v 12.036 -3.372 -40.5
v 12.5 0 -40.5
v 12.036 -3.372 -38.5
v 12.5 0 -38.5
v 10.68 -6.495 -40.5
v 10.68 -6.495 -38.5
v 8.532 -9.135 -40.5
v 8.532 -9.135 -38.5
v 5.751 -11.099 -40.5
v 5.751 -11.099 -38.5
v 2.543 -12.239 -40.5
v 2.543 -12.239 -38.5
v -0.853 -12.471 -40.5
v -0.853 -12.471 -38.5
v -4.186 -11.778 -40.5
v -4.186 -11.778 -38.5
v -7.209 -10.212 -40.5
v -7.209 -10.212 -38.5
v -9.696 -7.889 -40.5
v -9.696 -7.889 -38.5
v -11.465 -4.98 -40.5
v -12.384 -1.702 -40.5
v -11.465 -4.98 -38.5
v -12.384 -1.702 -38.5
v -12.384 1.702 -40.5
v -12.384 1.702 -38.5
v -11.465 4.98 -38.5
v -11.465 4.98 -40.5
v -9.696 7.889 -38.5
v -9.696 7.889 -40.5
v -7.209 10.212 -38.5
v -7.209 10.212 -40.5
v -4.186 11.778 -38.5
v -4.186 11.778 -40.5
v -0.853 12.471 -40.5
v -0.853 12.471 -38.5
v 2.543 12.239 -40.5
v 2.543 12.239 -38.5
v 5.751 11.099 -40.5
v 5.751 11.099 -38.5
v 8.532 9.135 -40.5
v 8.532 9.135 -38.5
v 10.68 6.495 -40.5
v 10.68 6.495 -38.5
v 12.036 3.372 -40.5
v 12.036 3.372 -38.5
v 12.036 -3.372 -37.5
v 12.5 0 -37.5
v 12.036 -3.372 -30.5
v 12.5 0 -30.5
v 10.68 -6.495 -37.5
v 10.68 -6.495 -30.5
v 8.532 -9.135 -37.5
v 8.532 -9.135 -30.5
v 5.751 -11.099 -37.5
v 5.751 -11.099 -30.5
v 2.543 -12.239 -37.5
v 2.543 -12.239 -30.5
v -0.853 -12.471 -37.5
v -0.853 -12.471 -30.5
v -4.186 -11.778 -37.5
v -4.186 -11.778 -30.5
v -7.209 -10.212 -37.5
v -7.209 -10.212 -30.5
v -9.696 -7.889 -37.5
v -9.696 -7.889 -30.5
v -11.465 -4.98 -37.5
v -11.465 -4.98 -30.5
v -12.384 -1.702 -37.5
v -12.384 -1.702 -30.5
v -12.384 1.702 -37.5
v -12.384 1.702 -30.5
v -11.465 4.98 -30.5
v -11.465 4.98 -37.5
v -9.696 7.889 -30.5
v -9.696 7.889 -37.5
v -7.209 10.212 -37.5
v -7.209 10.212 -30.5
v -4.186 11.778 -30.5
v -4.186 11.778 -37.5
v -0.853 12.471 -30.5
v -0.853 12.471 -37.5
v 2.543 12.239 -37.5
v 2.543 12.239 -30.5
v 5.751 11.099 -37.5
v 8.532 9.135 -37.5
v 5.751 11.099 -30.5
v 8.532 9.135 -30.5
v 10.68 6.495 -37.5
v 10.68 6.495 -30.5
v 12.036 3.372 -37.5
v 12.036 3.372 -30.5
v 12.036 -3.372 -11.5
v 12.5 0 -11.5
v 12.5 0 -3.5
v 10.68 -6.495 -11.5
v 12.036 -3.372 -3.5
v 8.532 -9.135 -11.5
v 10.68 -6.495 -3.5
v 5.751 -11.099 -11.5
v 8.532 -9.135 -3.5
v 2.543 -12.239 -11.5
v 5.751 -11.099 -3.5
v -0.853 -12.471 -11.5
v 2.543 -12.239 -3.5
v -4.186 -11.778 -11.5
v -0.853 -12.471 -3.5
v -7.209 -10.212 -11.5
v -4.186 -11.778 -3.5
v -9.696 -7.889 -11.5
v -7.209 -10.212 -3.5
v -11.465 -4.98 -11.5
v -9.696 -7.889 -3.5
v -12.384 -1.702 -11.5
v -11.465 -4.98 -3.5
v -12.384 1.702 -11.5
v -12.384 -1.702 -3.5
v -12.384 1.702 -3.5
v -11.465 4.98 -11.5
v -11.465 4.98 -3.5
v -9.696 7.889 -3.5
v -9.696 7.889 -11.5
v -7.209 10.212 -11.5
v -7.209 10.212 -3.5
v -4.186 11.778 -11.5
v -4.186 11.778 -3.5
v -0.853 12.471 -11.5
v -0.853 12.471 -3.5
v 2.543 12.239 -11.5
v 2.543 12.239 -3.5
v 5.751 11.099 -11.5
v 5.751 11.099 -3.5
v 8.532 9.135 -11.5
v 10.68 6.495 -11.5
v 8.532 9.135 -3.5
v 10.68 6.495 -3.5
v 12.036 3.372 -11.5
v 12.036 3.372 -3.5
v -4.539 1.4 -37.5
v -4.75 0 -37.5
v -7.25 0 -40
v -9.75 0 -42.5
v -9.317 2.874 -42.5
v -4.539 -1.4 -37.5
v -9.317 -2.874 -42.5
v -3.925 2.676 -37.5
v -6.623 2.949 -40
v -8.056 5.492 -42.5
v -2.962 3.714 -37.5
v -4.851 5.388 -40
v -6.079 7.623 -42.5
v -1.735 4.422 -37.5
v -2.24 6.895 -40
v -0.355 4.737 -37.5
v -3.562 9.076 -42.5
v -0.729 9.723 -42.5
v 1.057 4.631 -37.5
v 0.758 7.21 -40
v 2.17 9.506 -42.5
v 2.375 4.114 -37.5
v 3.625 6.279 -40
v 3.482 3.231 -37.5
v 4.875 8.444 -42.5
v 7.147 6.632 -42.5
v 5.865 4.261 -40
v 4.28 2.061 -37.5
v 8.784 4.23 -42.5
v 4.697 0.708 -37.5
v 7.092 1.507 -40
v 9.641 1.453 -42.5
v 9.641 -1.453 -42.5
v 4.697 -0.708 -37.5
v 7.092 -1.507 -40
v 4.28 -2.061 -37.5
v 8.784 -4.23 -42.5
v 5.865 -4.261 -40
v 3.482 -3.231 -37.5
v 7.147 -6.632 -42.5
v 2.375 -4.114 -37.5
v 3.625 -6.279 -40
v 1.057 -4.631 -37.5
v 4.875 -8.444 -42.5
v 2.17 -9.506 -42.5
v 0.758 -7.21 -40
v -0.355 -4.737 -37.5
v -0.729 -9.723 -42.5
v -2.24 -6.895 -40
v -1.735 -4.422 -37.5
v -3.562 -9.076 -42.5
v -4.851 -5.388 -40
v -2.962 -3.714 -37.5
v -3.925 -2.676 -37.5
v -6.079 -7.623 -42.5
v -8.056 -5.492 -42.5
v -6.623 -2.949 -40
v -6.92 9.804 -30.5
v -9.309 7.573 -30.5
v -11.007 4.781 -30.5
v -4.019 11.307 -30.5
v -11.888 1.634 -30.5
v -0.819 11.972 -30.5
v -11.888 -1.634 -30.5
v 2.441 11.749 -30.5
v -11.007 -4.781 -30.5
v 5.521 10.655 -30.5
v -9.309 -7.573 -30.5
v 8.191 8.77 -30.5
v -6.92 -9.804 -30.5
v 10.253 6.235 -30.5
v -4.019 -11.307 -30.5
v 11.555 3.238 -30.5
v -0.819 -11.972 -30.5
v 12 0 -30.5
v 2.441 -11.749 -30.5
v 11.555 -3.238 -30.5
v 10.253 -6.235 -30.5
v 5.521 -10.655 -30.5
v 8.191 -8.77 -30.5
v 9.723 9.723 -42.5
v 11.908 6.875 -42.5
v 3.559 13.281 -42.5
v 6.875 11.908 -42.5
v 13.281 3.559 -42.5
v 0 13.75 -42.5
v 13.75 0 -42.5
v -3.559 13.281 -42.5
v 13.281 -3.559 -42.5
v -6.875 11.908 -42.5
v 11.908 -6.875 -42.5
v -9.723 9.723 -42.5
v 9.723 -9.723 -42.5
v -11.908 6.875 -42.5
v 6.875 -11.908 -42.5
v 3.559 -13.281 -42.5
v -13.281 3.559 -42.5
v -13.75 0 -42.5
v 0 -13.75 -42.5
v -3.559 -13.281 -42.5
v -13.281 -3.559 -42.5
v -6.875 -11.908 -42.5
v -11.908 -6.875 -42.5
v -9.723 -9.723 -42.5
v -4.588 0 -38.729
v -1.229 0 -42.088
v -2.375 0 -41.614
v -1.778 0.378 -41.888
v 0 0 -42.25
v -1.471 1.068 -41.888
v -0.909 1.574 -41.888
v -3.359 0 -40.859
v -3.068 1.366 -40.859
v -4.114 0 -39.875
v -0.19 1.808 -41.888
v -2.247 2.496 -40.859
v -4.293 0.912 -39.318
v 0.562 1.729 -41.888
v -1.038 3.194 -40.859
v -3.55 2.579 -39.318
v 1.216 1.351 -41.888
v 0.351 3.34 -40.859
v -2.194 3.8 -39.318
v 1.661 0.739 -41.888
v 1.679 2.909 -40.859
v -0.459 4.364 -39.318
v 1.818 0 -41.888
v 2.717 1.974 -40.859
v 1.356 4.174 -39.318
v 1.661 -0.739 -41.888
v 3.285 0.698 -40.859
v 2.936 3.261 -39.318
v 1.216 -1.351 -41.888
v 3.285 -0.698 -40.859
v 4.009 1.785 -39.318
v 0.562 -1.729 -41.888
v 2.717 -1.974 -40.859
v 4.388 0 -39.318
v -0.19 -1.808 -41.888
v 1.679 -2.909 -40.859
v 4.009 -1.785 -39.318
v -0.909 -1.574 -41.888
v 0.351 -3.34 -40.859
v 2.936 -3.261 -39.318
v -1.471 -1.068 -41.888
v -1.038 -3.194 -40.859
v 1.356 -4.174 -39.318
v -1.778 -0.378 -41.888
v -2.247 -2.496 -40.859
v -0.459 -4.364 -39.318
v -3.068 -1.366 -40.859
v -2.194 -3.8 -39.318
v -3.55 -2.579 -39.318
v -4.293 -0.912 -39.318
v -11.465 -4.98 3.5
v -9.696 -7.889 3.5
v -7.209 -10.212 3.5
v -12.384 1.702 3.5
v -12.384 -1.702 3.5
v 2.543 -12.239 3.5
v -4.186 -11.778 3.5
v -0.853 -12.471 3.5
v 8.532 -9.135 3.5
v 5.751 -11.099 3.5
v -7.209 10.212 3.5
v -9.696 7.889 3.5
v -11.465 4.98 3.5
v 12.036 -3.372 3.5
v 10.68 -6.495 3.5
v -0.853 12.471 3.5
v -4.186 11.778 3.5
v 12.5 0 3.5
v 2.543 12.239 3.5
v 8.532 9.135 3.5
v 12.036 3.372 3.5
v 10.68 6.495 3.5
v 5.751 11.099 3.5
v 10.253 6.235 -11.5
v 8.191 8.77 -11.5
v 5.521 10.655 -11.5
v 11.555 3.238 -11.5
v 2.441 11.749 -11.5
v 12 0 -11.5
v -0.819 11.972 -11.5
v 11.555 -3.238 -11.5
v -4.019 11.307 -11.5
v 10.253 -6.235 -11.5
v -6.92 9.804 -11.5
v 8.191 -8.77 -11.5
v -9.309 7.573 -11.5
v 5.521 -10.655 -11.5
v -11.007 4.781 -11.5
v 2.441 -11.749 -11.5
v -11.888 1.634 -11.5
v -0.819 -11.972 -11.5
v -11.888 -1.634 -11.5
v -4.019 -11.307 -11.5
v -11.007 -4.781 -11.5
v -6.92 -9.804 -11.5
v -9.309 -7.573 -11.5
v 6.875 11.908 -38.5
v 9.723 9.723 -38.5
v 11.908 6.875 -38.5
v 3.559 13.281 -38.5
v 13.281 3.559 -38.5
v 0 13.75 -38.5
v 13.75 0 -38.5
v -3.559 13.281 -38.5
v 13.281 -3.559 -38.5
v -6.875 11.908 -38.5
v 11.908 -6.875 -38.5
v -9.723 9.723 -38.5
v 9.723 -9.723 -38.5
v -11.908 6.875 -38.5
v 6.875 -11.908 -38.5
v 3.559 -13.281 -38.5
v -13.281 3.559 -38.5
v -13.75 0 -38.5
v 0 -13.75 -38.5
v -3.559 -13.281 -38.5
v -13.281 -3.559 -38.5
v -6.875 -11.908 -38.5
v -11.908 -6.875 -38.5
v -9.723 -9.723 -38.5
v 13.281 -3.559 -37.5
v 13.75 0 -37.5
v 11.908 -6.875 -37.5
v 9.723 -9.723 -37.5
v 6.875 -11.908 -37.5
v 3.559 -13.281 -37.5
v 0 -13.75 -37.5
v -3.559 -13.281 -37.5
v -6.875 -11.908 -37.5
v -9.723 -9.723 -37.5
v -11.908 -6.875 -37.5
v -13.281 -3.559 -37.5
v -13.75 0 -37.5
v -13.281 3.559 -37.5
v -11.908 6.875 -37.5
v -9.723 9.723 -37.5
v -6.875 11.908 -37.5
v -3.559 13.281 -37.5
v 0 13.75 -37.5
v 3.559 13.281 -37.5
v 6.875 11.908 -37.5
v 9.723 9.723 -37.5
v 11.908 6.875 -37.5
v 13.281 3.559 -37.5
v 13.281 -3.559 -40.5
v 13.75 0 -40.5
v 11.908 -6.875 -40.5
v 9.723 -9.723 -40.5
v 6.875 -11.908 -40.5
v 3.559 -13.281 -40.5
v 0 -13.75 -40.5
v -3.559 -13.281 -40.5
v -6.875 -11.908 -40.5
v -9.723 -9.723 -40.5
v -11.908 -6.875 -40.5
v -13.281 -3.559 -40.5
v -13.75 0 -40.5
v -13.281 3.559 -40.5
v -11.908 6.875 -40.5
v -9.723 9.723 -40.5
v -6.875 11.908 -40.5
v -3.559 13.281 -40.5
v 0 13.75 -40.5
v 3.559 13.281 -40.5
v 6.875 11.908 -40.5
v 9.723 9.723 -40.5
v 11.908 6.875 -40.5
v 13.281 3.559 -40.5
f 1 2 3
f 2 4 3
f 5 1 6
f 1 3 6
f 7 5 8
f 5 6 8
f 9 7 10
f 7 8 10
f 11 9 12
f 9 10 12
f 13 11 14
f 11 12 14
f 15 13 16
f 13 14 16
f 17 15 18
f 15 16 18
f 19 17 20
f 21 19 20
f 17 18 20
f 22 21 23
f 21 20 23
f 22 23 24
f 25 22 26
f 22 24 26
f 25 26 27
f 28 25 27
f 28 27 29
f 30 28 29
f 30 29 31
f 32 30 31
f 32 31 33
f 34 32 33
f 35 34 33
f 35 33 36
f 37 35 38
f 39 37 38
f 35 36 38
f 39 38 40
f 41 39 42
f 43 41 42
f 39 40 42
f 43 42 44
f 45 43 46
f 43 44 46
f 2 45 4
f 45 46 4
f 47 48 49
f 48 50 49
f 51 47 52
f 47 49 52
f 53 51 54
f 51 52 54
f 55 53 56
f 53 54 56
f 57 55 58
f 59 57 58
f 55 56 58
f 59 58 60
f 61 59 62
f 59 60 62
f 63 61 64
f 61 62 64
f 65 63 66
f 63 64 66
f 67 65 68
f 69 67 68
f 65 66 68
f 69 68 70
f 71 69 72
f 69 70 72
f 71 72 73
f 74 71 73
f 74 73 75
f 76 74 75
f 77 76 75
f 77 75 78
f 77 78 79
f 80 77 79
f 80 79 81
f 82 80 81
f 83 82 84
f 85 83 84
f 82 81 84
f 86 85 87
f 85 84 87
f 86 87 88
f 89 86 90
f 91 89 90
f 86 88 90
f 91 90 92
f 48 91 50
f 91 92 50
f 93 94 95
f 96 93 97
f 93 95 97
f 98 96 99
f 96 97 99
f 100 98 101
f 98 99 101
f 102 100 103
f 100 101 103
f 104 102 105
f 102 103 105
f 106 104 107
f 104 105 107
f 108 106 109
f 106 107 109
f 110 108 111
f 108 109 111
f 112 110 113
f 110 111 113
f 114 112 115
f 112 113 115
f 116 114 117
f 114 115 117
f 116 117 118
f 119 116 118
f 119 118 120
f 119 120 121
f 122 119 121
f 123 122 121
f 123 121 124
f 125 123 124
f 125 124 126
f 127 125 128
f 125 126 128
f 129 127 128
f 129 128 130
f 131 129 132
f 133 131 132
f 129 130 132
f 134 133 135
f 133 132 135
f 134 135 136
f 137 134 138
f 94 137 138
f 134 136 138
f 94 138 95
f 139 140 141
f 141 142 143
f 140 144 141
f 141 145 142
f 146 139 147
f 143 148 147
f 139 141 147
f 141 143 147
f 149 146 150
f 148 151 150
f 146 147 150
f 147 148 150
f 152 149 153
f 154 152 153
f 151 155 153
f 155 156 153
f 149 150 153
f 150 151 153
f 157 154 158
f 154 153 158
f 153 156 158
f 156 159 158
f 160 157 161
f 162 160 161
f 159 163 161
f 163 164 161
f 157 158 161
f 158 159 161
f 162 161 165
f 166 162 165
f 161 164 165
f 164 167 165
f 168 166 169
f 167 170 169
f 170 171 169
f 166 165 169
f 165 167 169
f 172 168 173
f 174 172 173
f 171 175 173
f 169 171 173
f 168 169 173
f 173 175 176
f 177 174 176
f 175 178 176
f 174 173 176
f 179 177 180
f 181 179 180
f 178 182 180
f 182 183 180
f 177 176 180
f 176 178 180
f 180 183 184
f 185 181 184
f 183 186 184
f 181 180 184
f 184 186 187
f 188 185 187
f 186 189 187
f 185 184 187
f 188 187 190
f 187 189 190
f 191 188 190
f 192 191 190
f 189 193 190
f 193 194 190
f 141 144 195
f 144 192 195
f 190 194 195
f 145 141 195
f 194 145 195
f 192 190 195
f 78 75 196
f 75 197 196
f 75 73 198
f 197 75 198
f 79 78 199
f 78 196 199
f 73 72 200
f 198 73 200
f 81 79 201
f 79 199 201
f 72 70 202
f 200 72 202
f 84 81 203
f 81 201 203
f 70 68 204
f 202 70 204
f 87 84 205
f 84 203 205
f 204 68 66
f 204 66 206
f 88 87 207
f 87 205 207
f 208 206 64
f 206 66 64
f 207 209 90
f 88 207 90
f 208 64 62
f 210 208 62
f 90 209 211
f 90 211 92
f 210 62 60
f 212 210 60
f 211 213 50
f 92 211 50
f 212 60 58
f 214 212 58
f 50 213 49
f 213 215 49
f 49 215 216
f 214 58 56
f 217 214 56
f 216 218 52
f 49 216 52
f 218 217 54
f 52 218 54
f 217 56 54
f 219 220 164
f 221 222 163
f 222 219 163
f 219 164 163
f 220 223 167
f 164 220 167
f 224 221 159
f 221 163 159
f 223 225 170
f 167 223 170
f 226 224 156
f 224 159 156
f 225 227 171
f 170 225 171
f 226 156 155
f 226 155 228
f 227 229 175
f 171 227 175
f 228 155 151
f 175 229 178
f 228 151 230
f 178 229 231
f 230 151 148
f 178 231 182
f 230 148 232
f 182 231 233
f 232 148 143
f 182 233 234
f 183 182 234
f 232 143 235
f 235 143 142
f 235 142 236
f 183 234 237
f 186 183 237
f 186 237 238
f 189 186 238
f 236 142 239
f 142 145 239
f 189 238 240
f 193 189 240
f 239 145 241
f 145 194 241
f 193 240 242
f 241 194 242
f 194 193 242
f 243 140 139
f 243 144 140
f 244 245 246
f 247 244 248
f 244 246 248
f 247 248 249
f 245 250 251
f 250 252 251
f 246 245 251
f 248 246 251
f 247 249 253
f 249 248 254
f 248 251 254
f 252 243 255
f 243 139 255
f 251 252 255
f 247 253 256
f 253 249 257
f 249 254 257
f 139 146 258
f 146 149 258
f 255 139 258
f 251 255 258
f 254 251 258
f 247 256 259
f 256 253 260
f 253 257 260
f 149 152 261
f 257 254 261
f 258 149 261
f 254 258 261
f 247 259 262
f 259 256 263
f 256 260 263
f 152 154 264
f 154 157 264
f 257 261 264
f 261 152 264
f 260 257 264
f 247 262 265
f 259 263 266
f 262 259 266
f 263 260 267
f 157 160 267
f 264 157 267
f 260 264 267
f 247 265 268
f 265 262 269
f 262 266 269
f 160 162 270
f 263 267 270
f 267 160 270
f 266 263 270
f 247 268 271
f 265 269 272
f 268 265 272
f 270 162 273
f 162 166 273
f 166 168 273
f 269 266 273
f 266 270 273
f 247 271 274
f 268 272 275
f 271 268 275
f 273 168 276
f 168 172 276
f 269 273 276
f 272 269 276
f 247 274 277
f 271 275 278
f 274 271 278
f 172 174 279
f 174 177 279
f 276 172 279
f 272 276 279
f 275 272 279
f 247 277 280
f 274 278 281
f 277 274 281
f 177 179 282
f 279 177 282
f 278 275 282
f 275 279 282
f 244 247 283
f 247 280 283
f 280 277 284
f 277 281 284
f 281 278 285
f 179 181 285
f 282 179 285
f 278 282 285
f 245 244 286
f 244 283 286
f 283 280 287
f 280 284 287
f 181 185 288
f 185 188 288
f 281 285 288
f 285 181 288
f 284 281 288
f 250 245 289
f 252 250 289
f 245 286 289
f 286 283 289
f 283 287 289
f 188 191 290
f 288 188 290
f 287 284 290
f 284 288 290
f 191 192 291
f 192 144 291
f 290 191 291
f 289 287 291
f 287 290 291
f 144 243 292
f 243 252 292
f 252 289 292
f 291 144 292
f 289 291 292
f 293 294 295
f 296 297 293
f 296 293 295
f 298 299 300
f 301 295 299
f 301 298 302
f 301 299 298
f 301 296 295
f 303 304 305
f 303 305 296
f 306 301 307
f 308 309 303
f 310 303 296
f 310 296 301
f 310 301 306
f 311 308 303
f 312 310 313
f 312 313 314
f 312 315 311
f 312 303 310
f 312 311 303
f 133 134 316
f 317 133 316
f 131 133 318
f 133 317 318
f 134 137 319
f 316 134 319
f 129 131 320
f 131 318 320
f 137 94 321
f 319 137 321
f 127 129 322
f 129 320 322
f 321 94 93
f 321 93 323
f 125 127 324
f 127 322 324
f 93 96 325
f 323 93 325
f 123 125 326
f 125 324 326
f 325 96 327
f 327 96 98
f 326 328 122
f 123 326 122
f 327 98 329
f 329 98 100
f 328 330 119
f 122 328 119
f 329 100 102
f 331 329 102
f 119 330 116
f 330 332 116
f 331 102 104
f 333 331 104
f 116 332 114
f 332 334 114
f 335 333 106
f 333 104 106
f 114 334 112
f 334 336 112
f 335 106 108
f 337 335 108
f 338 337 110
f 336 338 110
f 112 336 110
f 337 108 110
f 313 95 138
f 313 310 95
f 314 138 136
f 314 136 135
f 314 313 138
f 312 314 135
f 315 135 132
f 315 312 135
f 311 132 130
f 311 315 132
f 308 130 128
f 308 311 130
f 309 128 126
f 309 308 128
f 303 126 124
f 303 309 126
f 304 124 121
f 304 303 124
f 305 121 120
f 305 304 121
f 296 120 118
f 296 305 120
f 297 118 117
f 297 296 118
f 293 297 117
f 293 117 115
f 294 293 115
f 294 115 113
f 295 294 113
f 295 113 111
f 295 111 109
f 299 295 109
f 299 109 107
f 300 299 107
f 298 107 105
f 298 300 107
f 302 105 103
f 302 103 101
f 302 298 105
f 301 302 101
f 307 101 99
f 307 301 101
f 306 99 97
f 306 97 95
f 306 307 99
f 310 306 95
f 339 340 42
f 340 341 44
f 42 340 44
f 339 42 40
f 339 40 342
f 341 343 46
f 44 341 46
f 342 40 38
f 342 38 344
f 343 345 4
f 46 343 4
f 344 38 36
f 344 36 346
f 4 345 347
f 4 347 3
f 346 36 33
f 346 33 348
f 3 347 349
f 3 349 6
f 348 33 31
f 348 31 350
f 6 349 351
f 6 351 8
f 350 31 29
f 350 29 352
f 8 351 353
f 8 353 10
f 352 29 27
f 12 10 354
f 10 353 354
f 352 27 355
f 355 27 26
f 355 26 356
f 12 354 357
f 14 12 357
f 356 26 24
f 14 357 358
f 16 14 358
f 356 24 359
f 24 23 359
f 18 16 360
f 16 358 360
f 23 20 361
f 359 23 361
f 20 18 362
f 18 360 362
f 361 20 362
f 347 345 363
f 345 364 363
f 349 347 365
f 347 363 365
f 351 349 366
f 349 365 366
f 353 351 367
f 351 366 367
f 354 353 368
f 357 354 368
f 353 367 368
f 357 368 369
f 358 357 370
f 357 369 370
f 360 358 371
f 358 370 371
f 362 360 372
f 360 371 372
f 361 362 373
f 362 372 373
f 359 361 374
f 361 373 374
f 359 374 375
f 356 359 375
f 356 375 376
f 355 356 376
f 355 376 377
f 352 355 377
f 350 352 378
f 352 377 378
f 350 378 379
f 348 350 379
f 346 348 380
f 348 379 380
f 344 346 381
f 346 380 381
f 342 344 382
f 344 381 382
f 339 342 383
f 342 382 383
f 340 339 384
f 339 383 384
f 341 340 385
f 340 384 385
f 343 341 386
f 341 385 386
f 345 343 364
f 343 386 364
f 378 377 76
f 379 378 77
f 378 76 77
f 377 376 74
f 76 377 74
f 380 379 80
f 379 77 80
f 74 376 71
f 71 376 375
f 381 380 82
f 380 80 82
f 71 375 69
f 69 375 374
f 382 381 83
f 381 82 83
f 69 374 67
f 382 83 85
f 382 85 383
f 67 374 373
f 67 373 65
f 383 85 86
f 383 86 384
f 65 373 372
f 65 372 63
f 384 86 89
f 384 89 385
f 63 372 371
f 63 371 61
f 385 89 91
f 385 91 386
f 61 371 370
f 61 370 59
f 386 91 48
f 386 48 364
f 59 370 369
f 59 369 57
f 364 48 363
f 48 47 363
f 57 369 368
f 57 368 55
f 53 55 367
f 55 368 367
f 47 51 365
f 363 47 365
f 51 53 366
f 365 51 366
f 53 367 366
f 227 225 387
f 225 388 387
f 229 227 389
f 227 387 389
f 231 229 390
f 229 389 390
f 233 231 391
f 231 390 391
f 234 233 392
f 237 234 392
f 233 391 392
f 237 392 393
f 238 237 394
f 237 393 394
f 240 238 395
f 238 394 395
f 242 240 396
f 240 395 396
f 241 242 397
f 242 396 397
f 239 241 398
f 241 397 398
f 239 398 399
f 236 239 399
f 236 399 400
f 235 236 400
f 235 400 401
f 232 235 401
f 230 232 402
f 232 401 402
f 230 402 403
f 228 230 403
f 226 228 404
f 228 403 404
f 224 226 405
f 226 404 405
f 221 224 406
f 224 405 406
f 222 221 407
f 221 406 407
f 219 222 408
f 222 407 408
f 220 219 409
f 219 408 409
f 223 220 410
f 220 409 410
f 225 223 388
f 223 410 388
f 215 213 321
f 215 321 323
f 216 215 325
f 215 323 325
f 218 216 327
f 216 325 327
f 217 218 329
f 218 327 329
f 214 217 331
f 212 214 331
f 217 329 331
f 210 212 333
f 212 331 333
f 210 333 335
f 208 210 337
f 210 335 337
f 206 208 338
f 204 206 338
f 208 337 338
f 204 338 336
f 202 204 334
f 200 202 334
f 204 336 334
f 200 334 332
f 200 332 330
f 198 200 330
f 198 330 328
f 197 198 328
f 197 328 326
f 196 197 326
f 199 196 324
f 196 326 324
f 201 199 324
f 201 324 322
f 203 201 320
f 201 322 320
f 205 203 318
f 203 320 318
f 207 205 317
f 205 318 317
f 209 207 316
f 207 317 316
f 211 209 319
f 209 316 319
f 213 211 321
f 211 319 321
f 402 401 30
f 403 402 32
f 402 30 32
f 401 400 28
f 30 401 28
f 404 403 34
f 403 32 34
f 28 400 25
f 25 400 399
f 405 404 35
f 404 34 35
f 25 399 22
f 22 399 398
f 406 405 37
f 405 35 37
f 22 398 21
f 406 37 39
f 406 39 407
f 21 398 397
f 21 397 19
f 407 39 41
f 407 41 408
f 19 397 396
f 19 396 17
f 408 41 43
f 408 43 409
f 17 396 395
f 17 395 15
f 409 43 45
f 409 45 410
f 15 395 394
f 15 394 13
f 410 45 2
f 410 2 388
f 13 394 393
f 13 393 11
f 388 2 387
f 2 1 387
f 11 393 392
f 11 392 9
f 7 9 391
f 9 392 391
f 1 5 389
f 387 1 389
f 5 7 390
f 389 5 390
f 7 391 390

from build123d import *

# Parameters (mm, degrees)
SKETCH1_R           = 12.5
BOSS_EXTRUDE1_DEPTH = 3.5
SKETCH5_R           = 9.75
CUT_EXTRUDE2_DEPTH  = 5
CUT_EXTRUDE2_DRAFT  = -45


with BuildPart() as part:
    # Sketch1 → Boss-Extrude1 (new, symmetric)
    with BuildSketch(Plane.XY):
        Circle(SKETCH1_R)
    extrude(amount=BOSS_EXTRUDE1_DEPTH, both=True)

    # Sketch4 → Revolve1 (revolve)
    with BuildSketch(Plane(origin=(0, 0, 0), x_dir=(1, 0, 0), z_dir=(0, 1, 0)), mode=Mode.PRIVATE) as revolve1_sk:
        Polygon((-12.5, 3.5), (0, 3.5), (0, 42.5), (-13.75, 42.5), (-13.75, 40.5), (-12.5, 40.5), (-12.5, 38.5), (-13.75, 38.5), (-13.75, 37.5), (-12.5, 37.5), (-12.5, 30.5), (-12, 30.5), (-12, 11.5), (-12.5, 11.5), align=None)
    revolve(revolve1_sk.sketch.rotate(Axis((0, 0, -3.5), (0, 0, -1)), 180), axis=Axis((0, 0, -3.5), (0, 0, -1)))


with BuildPart() as cut_extrude2_tool:
    # Sketch5 → Cut-Extrude2 (with draft: the straight prism first)
    with BuildSketch(Plane(origin=(0, 0, -42.5), x_dir=(-1, 0, 0), z_dir=(0, 0, -1))):
        Circle(SKETCH5_R)
    extrude(amount=-CUT_EXTRUDE2_DEPTH)
    # Cut-Extrude2: the draft: its side faces are tilted about the plane it starts from
    cut_extrude2_sides = [cut_extrude2_tool.faces().sort_by_distance(p)[0] for p in [
        (9.75, 0, -40),
    ]]
    draft(cut_extrude2_sides, Plane(origin=(0, 0, -42.5), x_dir=(-1, 0, 0), z_dir=(0, 0, -1)), CUT_EXTRUDE2_DRAFT)


with BuildPart() as part_1:
    add(part.part)

    # Cut-Extrude2: cut by cut_extrude2_tool
    add(cut_extrude2_tool.part, mode=Mode.SUBTRACT)

    # Sketch6 → Revolve2 (revolve)
    with BuildSketch(Plane(origin=(0, 0, 0), x_dir=(1, 0, 0), z_dir=(0, 1, 0))):
        with BuildLine():
            Line((-4.75, 37.5), (0, 37.5))
            Line((0, 37.5), (0, 42.25))
            ThreePointArc((0, 42.25), (-3.358757211, 40.858757211), (-4.75, 37.5))
        make_face()
    revolve(axis=Axis((0, 0, -37.5), (0, 0, -1)))


solid = part_1.part
